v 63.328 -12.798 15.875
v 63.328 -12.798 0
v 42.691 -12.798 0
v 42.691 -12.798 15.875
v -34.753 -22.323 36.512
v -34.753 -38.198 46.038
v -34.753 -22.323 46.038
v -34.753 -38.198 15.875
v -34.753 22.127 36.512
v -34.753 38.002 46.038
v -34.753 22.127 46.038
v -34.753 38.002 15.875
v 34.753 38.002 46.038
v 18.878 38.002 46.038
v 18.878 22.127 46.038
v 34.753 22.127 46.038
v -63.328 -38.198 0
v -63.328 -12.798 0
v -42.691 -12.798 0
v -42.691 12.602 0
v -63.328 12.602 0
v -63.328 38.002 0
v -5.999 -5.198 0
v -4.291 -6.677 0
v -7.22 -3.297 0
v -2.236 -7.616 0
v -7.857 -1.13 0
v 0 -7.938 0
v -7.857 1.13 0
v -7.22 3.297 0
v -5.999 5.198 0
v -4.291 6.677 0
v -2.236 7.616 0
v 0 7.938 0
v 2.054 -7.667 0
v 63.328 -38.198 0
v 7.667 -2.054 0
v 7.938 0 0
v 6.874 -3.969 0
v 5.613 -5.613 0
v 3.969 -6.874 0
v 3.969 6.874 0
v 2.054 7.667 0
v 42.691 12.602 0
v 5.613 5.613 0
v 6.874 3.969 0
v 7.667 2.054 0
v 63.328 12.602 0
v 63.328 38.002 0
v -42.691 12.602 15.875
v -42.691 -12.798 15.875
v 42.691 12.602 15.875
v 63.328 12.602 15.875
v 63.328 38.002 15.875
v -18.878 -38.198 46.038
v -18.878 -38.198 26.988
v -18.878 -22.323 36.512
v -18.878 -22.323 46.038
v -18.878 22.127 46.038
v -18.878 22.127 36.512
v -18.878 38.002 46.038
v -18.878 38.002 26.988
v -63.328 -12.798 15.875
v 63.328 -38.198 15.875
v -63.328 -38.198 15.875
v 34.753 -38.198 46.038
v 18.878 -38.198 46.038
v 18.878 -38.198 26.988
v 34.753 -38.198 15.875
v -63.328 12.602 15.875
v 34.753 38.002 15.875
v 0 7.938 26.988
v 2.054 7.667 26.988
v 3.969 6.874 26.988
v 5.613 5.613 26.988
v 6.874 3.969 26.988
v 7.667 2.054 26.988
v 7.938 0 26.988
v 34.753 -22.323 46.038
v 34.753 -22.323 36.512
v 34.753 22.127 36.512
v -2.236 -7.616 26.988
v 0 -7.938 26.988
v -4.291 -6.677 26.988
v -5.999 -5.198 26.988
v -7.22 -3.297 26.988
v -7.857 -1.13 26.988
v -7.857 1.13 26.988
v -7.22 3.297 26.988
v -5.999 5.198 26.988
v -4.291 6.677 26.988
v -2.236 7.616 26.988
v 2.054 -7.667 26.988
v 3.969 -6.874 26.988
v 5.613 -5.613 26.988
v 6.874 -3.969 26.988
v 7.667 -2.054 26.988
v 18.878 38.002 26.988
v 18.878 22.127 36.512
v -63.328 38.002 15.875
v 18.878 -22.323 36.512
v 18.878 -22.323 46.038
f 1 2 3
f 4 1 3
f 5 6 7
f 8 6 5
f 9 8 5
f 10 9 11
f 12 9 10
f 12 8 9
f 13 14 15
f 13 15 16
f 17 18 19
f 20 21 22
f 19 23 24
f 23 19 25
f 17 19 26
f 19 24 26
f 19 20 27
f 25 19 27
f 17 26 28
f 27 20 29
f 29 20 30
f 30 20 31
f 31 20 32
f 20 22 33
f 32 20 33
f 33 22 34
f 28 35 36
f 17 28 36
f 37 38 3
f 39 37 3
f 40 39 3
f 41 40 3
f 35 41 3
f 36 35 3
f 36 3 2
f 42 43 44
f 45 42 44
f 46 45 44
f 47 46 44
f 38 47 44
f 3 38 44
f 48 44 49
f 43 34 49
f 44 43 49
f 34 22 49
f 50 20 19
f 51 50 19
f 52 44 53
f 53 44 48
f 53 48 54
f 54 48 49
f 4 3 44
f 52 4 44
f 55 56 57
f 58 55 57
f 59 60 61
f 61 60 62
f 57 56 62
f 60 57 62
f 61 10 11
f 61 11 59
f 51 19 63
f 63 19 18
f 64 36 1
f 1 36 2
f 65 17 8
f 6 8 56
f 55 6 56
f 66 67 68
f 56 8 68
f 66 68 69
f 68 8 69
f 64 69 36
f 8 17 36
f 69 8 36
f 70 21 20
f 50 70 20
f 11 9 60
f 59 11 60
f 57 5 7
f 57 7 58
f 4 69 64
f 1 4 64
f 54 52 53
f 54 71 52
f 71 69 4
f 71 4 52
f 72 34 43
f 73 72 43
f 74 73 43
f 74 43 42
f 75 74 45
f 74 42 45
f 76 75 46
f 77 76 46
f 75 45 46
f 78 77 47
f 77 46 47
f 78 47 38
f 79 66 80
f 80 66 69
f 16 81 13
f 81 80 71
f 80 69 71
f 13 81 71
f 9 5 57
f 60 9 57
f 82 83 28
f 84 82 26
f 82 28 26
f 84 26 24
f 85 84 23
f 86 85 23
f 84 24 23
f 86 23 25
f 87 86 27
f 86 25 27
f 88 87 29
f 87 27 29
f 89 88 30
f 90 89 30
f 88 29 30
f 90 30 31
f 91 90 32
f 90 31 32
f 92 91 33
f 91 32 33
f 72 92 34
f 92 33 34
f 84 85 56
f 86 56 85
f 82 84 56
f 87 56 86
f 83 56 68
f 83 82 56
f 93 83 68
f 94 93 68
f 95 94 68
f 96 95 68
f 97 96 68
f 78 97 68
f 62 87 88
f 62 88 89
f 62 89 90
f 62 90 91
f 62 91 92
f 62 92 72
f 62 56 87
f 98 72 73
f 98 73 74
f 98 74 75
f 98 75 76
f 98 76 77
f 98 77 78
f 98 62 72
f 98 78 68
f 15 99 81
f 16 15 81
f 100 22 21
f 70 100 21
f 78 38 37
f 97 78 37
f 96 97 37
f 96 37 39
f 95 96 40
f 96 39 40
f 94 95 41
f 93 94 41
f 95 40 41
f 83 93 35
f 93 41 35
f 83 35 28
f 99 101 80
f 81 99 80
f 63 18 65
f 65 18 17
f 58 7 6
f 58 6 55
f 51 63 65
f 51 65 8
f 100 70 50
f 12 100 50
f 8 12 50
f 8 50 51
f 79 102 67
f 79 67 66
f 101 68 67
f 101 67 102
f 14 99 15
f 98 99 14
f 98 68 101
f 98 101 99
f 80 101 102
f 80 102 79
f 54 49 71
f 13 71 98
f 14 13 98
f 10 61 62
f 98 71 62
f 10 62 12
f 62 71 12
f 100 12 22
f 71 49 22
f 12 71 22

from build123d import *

# Parameters (mm, degrees)
F1_DEPTH = 31.75
F0_W     = 31.75
F0_H     = 31.75
F2_DEPTH = 92.075
F0_H_2   = 88.9
F3_DEPTH = 73.025
F4_DEPTH = 53.975
F5_SCALE = 0.5


with BuildPart() as f1:
    # F0 (on Top) → F1 (new body)
    with BuildSketch(Plane.XY):
        Polygon((126.6564279795, 76.0030429602), (69.5064279795, 76.0030429602), (69.5064279795, 44.2530429602), (69.5064279795, -44.6469570398), (69.5064279795, -76.3969570398), (126.6564279795, -76.3969570398), (126.6564279795, -25.5969570398), (85.3814279795, -25.5969570398), (85.3814279795, 25.2030429602), (126.6564279795, 25.2030429602), align=None)
    extrude(amount=F1_DEPTH)

    # F0 (on Top) → F2 (join)
    with BuildSketch(Plane.XY):
        with Locations((53.6314279795, 60.1280429602)):
            Rectangle(F0_W, F0_H)
        with Locations((53.6314279795, -60.5219570398)):
            Rectangle(F0_W, F0_H)
    extrude(amount=F2_DEPTH)

    # F0 (on Top) → F3 (join)
    with BuildSketch(Plane.XY):
        with Locations((53.6314279795, -0.1969570398)):
            Rectangle(F0_W, F0_H_2)
    extrude(amount=F3_DEPTH)



with BuildPart() as f1b:
    # F0 (on Top) → F1, piece 2 (new body)
    with BuildSketch(Plane.XY):
        Polygon((-69.5064279795, 76.0030429602), (-126.6564279795, 76.0030429602), (-126.6564279795, 25.2030429602), (-85.3814279795, 25.2030429602), (-85.3814279795, -25.5969570398), (-126.6564279795, -25.5969570398), (-126.6564279795, -76.3969570398), (-69.5064279795, -76.3969570398), (-69.5064279795, -44.6469570398), (-69.5064279795, 44.2530429602), align=None)
    extrude(amount=F1_DEPTH)

    # F0 (on Top) → F2, piece 2 (join)
    with BuildSketch(Plane.XY):
        with Locations((-53.6314279795, 60.1280429602)):
            Rectangle(F0_W, F0_H)
        with Locations((-53.6314279795, -60.5219570398)):
            Rectangle(F0_W, F0_H)
    extrude(amount=F2_DEPTH)

    # F0 (on Top) → F3, piece 2 (join)
    with BuildSketch(Plane.XY):
        with Locations((-53.6314279795, -0.1969570398)):
            Rectangle(F0_W, F0_H_2)
    extrude(amount=F3_DEPTH)


with BuildPart() as f1_1:
    add(f1.part)

    add(f1b.part)  # F4 merges F1b
    # F0 (on Top) → F4 (join)
    with BuildSketch(Plane.XY):
        with BuildLine():
            Line((37.7564279795, 76.0030429602), (0, 76.0030429602))
            Line((0, 76.0030429602), (0, 15.875))
            ThreePointArc((0, 15.875), (11.2253201513, 11.2253201513), (15.875, 0))
            ThreePointArc((15.875, 0), (11.2253201513, -11.2253201513), (0, -15.875))
            Line((0, -15.875), (0, -76.3969570398))
            Line((0, -76.3969570398), (37.7564279795, -76.3969570398))
            Line((37.7564279795, -76.3969570398), (37.7564279795, -44.6469570398))
            Line((37.7564279795, -44.6469570398), (37.7564279795, 44.2530429602))
            Line((37.7564279795, 44.2530429602), (37.7564279795, 76.0030429602))
        make_face()
        with BuildLine():
            Line((0, 76.0030429602), (-37.7564279795, 76.0030429602))
            Line((-37.7564279795, 76.0030429602), (-37.7564279795, 44.2530429602))
            Line((-37.7564279795, 44.2530429602), (-37.7564279795, -44.6469570398))
            Line((-37.7564279795, -44.6469570398), (-37.7564279795, -76.3969570398))
            Line((-37.7564279795, -76.3969570398), (0, -76.3969570398))
            Line((0, -76.3969570398), (0, -15.875))
            ThreePointArc((0, -15.875), (-15.875, 0), (0, 15.875))
            Line((0, 15.875), (0, 76.0030429602))
        make_face()
    extrude(amount=F4_DEPTH)


with BuildPart() as f1_2:
    # F5: moved
    add(f1_1.part.scale(F5_SCALE))


solid = f1_2.part
